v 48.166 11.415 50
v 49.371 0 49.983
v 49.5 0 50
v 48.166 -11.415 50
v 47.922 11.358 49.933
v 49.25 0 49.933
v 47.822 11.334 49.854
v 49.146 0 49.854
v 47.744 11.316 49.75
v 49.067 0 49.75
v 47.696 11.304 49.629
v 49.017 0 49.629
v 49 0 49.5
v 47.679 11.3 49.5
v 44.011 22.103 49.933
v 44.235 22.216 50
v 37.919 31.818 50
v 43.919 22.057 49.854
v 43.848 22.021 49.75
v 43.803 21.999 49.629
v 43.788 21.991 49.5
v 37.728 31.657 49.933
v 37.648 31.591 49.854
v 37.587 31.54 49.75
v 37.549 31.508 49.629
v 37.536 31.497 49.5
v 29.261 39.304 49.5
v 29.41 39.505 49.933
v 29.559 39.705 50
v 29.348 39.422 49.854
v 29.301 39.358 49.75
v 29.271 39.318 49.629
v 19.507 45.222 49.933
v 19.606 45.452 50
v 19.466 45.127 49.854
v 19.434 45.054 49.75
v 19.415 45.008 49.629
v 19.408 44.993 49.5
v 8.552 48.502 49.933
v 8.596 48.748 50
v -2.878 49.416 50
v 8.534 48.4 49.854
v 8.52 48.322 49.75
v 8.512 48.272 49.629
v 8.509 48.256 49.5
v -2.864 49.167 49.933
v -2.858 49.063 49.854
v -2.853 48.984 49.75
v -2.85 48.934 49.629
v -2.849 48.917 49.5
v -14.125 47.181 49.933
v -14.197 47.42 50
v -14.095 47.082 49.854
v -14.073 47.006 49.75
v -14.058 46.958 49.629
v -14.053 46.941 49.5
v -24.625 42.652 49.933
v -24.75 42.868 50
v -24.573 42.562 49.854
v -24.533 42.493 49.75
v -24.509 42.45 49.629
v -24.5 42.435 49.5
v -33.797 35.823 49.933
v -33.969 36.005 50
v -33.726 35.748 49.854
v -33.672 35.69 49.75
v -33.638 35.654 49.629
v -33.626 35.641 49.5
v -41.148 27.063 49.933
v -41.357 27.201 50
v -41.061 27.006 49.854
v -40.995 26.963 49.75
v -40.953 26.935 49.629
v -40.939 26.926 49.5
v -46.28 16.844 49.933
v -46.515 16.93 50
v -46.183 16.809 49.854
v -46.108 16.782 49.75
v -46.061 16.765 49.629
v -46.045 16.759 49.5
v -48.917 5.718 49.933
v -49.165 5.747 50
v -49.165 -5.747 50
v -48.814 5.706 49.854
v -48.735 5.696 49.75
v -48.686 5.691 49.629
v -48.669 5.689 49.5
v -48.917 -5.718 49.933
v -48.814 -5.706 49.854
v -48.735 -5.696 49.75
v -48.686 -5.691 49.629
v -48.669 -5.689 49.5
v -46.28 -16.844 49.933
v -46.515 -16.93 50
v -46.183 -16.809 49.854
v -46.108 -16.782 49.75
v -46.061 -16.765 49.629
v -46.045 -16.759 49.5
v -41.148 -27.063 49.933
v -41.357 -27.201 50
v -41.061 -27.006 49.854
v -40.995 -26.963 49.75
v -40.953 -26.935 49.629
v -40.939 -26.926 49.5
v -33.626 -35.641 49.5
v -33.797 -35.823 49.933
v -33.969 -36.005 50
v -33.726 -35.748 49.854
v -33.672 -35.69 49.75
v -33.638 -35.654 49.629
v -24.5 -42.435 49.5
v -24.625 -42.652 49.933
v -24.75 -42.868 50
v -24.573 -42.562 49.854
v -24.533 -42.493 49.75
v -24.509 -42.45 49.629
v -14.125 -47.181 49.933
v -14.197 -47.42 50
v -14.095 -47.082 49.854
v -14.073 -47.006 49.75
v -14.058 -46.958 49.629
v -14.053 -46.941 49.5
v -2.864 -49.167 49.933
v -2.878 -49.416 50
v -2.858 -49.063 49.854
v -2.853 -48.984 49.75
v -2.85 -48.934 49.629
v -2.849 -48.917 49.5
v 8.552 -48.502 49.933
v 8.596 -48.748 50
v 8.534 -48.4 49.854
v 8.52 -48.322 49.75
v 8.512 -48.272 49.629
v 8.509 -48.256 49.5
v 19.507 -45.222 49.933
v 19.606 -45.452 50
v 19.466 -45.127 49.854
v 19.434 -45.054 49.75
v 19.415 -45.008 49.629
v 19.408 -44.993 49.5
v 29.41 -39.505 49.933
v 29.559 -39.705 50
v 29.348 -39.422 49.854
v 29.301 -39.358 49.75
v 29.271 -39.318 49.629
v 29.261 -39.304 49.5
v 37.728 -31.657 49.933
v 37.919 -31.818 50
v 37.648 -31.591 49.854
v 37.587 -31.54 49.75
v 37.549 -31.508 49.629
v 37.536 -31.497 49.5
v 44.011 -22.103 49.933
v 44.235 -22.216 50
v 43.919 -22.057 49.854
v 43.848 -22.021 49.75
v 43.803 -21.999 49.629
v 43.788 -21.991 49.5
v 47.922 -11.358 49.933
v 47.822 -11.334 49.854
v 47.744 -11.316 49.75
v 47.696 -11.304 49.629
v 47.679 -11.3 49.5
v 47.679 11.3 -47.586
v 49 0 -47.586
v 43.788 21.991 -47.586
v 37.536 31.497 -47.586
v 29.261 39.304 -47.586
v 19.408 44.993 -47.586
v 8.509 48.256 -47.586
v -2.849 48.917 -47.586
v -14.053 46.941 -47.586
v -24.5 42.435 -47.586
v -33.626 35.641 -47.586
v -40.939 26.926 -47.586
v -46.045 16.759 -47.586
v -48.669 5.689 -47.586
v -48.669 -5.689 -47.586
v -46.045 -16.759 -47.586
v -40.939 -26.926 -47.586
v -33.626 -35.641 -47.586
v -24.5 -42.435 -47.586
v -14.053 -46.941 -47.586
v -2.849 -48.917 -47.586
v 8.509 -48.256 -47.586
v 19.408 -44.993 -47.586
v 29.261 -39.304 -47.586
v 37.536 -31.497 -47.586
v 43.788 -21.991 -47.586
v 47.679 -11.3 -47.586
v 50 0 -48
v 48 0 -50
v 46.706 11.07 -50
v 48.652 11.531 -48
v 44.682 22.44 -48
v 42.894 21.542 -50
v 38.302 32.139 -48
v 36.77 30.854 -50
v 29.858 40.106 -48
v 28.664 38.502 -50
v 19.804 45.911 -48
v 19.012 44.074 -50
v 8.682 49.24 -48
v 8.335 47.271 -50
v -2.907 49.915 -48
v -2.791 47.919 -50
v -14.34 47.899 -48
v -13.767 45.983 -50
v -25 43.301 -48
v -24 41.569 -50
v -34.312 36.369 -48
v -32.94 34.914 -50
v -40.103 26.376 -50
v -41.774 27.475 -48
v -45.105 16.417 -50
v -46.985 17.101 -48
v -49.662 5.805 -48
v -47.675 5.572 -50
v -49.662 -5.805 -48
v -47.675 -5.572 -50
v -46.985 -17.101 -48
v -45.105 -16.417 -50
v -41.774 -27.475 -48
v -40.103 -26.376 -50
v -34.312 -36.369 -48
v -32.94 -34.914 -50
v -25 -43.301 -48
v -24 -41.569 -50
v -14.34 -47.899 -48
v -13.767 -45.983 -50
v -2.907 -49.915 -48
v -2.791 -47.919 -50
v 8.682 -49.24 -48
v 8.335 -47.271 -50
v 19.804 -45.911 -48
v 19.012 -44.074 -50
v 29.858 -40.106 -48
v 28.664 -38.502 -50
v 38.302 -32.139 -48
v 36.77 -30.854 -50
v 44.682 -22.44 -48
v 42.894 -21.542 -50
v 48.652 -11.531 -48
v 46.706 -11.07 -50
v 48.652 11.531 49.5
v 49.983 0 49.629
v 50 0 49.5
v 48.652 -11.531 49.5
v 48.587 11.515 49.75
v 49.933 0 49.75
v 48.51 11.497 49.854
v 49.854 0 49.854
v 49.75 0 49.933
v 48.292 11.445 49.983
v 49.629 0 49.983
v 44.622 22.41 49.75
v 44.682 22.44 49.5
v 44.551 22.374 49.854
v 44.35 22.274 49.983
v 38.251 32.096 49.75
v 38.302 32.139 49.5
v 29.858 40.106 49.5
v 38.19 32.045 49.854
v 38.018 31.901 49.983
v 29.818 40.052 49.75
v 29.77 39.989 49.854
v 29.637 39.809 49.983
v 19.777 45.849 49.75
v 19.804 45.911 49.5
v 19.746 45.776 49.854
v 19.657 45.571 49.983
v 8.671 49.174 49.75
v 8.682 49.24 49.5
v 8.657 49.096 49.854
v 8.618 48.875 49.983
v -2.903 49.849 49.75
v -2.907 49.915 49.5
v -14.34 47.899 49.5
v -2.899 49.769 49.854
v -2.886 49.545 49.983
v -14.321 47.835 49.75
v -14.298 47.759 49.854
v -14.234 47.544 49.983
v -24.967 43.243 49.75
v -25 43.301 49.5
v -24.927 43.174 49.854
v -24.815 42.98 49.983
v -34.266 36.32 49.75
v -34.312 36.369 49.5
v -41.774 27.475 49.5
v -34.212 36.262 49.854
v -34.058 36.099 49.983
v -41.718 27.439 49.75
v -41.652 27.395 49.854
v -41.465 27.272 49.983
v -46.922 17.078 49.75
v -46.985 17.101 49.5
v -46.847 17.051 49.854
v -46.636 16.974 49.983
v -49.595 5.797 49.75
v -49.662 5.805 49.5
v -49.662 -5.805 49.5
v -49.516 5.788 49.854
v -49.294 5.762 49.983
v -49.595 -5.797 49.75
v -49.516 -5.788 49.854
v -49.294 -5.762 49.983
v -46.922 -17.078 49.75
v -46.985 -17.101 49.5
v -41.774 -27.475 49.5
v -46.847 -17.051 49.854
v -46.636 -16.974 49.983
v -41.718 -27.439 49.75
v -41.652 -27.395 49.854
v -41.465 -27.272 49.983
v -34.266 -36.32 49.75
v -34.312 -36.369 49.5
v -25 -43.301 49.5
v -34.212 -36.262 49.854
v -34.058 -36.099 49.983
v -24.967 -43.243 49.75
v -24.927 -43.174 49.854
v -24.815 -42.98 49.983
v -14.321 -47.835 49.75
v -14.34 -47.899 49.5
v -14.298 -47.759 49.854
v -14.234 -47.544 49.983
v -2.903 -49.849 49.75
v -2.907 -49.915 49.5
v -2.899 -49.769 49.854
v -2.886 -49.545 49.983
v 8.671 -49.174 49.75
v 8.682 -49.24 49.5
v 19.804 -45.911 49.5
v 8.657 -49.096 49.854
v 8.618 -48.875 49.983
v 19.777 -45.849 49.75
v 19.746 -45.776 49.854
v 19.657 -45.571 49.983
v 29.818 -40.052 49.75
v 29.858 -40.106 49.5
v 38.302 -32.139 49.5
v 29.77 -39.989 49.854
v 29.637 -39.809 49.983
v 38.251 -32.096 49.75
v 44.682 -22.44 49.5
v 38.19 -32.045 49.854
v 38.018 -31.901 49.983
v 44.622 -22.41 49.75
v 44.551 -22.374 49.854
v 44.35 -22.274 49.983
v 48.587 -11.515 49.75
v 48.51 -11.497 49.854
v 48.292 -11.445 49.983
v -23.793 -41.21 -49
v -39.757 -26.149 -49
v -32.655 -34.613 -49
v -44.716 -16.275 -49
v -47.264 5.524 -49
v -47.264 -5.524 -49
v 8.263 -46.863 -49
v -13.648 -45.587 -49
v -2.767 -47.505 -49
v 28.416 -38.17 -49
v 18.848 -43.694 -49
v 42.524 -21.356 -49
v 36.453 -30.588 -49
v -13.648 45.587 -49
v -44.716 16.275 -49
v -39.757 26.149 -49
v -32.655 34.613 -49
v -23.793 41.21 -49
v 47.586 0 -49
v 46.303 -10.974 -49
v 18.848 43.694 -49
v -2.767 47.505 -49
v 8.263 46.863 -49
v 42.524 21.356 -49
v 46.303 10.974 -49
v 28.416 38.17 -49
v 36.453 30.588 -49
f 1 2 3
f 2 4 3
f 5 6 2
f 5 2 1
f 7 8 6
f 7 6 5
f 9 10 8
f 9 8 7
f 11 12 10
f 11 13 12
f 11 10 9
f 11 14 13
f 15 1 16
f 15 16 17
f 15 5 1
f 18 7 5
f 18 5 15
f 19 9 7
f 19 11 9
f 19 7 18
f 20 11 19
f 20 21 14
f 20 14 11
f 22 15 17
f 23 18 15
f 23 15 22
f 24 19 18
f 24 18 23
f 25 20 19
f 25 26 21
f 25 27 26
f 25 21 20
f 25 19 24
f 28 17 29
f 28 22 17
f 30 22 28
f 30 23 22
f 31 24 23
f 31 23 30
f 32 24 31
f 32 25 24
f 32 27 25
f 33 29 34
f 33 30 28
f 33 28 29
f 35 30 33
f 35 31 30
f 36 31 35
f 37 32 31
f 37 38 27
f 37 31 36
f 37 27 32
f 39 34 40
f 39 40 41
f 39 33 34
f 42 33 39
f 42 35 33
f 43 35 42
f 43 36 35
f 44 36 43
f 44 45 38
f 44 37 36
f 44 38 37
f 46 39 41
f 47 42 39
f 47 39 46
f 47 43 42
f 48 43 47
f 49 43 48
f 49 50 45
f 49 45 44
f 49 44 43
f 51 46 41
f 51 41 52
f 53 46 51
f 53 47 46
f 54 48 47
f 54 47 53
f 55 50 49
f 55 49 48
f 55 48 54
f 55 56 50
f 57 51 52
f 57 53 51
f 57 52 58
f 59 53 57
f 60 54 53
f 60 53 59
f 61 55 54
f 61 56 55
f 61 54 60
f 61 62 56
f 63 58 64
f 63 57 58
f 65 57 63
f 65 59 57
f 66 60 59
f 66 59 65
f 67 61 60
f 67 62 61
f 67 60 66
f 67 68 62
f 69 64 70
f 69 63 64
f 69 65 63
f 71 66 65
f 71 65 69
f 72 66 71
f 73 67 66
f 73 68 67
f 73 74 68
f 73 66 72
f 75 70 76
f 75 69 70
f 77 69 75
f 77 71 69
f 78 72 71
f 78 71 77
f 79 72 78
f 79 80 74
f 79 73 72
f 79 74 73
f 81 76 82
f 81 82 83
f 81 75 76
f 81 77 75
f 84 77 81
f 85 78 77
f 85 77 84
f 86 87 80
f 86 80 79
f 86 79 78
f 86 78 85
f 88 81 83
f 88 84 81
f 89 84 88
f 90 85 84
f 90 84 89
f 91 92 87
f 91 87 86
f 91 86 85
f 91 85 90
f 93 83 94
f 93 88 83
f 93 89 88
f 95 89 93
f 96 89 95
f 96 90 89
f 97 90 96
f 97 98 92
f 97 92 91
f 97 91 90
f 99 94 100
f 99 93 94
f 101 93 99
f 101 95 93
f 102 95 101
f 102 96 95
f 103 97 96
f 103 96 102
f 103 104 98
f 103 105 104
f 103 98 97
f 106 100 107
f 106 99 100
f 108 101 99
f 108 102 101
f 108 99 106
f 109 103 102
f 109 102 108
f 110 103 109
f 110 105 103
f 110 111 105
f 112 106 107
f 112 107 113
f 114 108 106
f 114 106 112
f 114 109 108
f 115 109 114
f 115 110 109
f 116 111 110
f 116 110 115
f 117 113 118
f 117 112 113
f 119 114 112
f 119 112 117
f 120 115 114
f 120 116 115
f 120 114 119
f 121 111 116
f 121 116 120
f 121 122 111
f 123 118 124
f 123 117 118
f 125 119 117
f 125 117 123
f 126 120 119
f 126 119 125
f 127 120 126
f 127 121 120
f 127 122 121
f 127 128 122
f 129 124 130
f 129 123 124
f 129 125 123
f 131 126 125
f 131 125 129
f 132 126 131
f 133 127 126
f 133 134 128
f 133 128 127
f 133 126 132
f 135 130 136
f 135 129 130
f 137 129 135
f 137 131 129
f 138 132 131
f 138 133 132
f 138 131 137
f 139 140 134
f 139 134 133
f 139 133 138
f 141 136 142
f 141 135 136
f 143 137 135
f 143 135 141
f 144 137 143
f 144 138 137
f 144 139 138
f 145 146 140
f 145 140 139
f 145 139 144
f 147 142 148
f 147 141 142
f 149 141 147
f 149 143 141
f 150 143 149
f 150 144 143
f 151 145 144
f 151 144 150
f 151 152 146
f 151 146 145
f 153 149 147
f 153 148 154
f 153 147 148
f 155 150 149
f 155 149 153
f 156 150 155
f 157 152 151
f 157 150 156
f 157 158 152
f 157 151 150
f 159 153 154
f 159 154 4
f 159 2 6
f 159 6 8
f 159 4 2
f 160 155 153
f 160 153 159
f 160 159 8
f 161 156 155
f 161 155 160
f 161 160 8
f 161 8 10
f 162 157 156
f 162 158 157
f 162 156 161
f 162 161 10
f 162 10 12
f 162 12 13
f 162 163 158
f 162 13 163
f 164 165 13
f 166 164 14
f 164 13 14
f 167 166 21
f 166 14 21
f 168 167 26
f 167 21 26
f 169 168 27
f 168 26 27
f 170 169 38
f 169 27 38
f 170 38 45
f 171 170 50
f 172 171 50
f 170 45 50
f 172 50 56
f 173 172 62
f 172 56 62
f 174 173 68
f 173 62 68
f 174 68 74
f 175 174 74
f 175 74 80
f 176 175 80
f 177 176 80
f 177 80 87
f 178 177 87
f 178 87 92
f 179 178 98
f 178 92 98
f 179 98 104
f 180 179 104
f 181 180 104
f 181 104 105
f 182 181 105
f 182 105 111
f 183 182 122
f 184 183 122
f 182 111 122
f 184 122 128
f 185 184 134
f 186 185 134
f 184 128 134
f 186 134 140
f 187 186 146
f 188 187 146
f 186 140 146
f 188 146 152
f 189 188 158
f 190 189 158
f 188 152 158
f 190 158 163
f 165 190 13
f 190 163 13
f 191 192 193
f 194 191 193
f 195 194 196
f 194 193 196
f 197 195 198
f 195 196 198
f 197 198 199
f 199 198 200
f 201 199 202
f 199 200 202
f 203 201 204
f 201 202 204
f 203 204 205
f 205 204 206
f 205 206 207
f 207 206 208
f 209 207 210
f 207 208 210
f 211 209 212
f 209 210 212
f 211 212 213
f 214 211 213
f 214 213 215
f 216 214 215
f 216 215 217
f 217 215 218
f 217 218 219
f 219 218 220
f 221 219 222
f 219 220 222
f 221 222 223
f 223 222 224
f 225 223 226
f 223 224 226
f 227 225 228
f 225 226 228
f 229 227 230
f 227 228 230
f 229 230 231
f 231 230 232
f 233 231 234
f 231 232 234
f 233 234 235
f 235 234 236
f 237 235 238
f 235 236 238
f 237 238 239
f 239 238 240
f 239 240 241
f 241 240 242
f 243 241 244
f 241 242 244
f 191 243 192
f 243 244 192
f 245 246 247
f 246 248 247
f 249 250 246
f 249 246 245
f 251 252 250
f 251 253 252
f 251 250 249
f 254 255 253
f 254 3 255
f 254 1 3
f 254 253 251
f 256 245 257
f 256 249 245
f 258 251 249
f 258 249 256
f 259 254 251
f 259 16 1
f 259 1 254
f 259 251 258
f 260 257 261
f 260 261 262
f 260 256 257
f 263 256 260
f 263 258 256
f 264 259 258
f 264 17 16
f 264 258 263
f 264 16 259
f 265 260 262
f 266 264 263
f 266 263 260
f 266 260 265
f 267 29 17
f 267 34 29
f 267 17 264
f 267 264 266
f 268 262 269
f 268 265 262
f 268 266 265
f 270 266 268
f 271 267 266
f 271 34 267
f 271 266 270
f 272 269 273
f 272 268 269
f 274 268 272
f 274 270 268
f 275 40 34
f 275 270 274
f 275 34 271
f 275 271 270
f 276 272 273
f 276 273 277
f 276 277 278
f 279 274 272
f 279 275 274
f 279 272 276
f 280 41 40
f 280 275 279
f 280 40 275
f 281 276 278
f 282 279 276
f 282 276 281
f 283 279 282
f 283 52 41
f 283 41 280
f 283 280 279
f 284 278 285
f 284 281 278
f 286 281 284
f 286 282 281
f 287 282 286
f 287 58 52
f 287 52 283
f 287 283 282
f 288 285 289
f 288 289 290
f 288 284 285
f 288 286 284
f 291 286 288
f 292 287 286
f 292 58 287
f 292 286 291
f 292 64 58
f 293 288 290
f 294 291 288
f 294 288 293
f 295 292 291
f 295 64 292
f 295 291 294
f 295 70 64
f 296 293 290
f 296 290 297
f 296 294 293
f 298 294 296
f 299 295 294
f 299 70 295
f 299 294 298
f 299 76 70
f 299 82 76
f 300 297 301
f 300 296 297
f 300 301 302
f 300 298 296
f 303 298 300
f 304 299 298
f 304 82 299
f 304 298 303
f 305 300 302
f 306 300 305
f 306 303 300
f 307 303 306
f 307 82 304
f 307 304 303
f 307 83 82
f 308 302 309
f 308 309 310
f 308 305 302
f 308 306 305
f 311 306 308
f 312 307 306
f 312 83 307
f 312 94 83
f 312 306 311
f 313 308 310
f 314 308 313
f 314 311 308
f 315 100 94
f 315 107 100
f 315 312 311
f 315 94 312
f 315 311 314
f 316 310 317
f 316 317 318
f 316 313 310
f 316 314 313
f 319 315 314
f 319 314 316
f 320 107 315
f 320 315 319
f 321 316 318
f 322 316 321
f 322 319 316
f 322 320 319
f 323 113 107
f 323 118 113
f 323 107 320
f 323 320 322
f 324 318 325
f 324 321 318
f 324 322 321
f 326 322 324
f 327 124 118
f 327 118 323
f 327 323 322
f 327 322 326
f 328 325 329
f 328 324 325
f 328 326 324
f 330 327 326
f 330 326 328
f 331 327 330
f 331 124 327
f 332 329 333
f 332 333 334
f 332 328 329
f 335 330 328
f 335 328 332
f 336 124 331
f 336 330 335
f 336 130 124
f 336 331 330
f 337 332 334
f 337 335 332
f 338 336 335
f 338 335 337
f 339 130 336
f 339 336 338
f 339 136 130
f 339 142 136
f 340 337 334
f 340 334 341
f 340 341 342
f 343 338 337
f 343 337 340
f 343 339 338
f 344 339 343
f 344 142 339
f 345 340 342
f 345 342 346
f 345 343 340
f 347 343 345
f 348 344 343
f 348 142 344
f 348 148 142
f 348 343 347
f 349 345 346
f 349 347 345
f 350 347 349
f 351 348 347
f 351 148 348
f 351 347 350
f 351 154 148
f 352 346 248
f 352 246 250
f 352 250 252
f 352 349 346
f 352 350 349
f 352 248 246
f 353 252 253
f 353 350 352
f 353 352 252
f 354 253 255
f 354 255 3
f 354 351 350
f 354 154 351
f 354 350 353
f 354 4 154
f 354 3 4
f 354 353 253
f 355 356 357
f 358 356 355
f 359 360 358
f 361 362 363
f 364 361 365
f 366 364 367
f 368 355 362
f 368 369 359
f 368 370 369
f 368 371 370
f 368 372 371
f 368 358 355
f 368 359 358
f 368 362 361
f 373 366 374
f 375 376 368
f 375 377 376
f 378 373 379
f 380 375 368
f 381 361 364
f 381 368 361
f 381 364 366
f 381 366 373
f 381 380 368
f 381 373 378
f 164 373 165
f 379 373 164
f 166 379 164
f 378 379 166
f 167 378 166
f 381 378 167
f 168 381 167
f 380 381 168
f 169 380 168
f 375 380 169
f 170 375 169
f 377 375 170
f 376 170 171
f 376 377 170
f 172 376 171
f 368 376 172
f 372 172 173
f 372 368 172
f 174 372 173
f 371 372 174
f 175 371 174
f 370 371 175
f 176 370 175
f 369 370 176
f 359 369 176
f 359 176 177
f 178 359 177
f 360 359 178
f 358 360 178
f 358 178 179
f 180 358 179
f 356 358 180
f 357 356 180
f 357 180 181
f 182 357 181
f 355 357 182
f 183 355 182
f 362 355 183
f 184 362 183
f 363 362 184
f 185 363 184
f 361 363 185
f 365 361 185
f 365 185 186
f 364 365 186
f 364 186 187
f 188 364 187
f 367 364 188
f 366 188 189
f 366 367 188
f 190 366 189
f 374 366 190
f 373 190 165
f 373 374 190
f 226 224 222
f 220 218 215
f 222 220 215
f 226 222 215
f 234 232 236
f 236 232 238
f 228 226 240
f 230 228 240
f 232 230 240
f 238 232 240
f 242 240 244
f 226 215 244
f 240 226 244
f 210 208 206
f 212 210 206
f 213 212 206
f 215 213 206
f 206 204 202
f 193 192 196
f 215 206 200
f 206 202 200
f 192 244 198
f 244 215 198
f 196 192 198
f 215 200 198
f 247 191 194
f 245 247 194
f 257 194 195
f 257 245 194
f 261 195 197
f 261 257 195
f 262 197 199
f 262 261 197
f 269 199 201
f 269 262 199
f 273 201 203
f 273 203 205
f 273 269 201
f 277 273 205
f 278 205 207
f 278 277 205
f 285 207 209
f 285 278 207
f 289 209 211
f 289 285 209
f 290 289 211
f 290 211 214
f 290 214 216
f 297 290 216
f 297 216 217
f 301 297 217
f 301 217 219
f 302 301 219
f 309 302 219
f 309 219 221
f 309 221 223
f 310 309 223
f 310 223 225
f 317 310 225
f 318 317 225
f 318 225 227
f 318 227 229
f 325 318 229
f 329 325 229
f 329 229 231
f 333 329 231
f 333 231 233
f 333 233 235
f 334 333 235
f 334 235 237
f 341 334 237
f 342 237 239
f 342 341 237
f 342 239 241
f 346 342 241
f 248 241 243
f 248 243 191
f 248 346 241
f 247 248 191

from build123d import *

# Parameters (mm, degrees)
F0_R     = 50
F1_DEPTH = 50
F2_DEPTH = 50
F3_SIZE  = 2
F4_T     = -1
F5_R     = 0.49999


# Not quite as in the source:
# - a fillet or chamfer is up to 0.001 mm smaller than in the source, because OpenCascade refuses the exact size


with BuildPart() as f1:
    # F0 (on Top) → F1 (new body)
    with BuildSketch(Plane.XY):
        Circle(F0_R)
    extrude(amount=F1_DEPTH)

    # F2 (add): a face of the model
    f2_faces = [f1.faces().sort_by_distance(p)[0] for p in [
        (0, 0, 0),
    ]]
    extrude(f2_faces, amount=F2_DEPTH)

    # F3
    f3_edges = [f1.edges().sort_by_distance(p)[0] for p in [
        (-50, 0, -50),
    ]]
    chamfer(f3_edges, length=F3_SIZE)

    # F4
    f4_openings = [f1.faces().sort_by_distance(p)[0] for p in [
        (0, 0, 50),
    ]]
    offset(amount=F4_T, openings=f4_openings)

    # F5 (radius 0.5 in the source; OpenCascade refuses exactly that, so slightly less here)
    f5_edges = [f1.edges().sort_by_distance(p)[0] for p in [
        (-50, 0, 50),
        (-49, 0, 50),
    ]]
    fillet(f5_edges, radius=F5_R)


solid = f1.part
